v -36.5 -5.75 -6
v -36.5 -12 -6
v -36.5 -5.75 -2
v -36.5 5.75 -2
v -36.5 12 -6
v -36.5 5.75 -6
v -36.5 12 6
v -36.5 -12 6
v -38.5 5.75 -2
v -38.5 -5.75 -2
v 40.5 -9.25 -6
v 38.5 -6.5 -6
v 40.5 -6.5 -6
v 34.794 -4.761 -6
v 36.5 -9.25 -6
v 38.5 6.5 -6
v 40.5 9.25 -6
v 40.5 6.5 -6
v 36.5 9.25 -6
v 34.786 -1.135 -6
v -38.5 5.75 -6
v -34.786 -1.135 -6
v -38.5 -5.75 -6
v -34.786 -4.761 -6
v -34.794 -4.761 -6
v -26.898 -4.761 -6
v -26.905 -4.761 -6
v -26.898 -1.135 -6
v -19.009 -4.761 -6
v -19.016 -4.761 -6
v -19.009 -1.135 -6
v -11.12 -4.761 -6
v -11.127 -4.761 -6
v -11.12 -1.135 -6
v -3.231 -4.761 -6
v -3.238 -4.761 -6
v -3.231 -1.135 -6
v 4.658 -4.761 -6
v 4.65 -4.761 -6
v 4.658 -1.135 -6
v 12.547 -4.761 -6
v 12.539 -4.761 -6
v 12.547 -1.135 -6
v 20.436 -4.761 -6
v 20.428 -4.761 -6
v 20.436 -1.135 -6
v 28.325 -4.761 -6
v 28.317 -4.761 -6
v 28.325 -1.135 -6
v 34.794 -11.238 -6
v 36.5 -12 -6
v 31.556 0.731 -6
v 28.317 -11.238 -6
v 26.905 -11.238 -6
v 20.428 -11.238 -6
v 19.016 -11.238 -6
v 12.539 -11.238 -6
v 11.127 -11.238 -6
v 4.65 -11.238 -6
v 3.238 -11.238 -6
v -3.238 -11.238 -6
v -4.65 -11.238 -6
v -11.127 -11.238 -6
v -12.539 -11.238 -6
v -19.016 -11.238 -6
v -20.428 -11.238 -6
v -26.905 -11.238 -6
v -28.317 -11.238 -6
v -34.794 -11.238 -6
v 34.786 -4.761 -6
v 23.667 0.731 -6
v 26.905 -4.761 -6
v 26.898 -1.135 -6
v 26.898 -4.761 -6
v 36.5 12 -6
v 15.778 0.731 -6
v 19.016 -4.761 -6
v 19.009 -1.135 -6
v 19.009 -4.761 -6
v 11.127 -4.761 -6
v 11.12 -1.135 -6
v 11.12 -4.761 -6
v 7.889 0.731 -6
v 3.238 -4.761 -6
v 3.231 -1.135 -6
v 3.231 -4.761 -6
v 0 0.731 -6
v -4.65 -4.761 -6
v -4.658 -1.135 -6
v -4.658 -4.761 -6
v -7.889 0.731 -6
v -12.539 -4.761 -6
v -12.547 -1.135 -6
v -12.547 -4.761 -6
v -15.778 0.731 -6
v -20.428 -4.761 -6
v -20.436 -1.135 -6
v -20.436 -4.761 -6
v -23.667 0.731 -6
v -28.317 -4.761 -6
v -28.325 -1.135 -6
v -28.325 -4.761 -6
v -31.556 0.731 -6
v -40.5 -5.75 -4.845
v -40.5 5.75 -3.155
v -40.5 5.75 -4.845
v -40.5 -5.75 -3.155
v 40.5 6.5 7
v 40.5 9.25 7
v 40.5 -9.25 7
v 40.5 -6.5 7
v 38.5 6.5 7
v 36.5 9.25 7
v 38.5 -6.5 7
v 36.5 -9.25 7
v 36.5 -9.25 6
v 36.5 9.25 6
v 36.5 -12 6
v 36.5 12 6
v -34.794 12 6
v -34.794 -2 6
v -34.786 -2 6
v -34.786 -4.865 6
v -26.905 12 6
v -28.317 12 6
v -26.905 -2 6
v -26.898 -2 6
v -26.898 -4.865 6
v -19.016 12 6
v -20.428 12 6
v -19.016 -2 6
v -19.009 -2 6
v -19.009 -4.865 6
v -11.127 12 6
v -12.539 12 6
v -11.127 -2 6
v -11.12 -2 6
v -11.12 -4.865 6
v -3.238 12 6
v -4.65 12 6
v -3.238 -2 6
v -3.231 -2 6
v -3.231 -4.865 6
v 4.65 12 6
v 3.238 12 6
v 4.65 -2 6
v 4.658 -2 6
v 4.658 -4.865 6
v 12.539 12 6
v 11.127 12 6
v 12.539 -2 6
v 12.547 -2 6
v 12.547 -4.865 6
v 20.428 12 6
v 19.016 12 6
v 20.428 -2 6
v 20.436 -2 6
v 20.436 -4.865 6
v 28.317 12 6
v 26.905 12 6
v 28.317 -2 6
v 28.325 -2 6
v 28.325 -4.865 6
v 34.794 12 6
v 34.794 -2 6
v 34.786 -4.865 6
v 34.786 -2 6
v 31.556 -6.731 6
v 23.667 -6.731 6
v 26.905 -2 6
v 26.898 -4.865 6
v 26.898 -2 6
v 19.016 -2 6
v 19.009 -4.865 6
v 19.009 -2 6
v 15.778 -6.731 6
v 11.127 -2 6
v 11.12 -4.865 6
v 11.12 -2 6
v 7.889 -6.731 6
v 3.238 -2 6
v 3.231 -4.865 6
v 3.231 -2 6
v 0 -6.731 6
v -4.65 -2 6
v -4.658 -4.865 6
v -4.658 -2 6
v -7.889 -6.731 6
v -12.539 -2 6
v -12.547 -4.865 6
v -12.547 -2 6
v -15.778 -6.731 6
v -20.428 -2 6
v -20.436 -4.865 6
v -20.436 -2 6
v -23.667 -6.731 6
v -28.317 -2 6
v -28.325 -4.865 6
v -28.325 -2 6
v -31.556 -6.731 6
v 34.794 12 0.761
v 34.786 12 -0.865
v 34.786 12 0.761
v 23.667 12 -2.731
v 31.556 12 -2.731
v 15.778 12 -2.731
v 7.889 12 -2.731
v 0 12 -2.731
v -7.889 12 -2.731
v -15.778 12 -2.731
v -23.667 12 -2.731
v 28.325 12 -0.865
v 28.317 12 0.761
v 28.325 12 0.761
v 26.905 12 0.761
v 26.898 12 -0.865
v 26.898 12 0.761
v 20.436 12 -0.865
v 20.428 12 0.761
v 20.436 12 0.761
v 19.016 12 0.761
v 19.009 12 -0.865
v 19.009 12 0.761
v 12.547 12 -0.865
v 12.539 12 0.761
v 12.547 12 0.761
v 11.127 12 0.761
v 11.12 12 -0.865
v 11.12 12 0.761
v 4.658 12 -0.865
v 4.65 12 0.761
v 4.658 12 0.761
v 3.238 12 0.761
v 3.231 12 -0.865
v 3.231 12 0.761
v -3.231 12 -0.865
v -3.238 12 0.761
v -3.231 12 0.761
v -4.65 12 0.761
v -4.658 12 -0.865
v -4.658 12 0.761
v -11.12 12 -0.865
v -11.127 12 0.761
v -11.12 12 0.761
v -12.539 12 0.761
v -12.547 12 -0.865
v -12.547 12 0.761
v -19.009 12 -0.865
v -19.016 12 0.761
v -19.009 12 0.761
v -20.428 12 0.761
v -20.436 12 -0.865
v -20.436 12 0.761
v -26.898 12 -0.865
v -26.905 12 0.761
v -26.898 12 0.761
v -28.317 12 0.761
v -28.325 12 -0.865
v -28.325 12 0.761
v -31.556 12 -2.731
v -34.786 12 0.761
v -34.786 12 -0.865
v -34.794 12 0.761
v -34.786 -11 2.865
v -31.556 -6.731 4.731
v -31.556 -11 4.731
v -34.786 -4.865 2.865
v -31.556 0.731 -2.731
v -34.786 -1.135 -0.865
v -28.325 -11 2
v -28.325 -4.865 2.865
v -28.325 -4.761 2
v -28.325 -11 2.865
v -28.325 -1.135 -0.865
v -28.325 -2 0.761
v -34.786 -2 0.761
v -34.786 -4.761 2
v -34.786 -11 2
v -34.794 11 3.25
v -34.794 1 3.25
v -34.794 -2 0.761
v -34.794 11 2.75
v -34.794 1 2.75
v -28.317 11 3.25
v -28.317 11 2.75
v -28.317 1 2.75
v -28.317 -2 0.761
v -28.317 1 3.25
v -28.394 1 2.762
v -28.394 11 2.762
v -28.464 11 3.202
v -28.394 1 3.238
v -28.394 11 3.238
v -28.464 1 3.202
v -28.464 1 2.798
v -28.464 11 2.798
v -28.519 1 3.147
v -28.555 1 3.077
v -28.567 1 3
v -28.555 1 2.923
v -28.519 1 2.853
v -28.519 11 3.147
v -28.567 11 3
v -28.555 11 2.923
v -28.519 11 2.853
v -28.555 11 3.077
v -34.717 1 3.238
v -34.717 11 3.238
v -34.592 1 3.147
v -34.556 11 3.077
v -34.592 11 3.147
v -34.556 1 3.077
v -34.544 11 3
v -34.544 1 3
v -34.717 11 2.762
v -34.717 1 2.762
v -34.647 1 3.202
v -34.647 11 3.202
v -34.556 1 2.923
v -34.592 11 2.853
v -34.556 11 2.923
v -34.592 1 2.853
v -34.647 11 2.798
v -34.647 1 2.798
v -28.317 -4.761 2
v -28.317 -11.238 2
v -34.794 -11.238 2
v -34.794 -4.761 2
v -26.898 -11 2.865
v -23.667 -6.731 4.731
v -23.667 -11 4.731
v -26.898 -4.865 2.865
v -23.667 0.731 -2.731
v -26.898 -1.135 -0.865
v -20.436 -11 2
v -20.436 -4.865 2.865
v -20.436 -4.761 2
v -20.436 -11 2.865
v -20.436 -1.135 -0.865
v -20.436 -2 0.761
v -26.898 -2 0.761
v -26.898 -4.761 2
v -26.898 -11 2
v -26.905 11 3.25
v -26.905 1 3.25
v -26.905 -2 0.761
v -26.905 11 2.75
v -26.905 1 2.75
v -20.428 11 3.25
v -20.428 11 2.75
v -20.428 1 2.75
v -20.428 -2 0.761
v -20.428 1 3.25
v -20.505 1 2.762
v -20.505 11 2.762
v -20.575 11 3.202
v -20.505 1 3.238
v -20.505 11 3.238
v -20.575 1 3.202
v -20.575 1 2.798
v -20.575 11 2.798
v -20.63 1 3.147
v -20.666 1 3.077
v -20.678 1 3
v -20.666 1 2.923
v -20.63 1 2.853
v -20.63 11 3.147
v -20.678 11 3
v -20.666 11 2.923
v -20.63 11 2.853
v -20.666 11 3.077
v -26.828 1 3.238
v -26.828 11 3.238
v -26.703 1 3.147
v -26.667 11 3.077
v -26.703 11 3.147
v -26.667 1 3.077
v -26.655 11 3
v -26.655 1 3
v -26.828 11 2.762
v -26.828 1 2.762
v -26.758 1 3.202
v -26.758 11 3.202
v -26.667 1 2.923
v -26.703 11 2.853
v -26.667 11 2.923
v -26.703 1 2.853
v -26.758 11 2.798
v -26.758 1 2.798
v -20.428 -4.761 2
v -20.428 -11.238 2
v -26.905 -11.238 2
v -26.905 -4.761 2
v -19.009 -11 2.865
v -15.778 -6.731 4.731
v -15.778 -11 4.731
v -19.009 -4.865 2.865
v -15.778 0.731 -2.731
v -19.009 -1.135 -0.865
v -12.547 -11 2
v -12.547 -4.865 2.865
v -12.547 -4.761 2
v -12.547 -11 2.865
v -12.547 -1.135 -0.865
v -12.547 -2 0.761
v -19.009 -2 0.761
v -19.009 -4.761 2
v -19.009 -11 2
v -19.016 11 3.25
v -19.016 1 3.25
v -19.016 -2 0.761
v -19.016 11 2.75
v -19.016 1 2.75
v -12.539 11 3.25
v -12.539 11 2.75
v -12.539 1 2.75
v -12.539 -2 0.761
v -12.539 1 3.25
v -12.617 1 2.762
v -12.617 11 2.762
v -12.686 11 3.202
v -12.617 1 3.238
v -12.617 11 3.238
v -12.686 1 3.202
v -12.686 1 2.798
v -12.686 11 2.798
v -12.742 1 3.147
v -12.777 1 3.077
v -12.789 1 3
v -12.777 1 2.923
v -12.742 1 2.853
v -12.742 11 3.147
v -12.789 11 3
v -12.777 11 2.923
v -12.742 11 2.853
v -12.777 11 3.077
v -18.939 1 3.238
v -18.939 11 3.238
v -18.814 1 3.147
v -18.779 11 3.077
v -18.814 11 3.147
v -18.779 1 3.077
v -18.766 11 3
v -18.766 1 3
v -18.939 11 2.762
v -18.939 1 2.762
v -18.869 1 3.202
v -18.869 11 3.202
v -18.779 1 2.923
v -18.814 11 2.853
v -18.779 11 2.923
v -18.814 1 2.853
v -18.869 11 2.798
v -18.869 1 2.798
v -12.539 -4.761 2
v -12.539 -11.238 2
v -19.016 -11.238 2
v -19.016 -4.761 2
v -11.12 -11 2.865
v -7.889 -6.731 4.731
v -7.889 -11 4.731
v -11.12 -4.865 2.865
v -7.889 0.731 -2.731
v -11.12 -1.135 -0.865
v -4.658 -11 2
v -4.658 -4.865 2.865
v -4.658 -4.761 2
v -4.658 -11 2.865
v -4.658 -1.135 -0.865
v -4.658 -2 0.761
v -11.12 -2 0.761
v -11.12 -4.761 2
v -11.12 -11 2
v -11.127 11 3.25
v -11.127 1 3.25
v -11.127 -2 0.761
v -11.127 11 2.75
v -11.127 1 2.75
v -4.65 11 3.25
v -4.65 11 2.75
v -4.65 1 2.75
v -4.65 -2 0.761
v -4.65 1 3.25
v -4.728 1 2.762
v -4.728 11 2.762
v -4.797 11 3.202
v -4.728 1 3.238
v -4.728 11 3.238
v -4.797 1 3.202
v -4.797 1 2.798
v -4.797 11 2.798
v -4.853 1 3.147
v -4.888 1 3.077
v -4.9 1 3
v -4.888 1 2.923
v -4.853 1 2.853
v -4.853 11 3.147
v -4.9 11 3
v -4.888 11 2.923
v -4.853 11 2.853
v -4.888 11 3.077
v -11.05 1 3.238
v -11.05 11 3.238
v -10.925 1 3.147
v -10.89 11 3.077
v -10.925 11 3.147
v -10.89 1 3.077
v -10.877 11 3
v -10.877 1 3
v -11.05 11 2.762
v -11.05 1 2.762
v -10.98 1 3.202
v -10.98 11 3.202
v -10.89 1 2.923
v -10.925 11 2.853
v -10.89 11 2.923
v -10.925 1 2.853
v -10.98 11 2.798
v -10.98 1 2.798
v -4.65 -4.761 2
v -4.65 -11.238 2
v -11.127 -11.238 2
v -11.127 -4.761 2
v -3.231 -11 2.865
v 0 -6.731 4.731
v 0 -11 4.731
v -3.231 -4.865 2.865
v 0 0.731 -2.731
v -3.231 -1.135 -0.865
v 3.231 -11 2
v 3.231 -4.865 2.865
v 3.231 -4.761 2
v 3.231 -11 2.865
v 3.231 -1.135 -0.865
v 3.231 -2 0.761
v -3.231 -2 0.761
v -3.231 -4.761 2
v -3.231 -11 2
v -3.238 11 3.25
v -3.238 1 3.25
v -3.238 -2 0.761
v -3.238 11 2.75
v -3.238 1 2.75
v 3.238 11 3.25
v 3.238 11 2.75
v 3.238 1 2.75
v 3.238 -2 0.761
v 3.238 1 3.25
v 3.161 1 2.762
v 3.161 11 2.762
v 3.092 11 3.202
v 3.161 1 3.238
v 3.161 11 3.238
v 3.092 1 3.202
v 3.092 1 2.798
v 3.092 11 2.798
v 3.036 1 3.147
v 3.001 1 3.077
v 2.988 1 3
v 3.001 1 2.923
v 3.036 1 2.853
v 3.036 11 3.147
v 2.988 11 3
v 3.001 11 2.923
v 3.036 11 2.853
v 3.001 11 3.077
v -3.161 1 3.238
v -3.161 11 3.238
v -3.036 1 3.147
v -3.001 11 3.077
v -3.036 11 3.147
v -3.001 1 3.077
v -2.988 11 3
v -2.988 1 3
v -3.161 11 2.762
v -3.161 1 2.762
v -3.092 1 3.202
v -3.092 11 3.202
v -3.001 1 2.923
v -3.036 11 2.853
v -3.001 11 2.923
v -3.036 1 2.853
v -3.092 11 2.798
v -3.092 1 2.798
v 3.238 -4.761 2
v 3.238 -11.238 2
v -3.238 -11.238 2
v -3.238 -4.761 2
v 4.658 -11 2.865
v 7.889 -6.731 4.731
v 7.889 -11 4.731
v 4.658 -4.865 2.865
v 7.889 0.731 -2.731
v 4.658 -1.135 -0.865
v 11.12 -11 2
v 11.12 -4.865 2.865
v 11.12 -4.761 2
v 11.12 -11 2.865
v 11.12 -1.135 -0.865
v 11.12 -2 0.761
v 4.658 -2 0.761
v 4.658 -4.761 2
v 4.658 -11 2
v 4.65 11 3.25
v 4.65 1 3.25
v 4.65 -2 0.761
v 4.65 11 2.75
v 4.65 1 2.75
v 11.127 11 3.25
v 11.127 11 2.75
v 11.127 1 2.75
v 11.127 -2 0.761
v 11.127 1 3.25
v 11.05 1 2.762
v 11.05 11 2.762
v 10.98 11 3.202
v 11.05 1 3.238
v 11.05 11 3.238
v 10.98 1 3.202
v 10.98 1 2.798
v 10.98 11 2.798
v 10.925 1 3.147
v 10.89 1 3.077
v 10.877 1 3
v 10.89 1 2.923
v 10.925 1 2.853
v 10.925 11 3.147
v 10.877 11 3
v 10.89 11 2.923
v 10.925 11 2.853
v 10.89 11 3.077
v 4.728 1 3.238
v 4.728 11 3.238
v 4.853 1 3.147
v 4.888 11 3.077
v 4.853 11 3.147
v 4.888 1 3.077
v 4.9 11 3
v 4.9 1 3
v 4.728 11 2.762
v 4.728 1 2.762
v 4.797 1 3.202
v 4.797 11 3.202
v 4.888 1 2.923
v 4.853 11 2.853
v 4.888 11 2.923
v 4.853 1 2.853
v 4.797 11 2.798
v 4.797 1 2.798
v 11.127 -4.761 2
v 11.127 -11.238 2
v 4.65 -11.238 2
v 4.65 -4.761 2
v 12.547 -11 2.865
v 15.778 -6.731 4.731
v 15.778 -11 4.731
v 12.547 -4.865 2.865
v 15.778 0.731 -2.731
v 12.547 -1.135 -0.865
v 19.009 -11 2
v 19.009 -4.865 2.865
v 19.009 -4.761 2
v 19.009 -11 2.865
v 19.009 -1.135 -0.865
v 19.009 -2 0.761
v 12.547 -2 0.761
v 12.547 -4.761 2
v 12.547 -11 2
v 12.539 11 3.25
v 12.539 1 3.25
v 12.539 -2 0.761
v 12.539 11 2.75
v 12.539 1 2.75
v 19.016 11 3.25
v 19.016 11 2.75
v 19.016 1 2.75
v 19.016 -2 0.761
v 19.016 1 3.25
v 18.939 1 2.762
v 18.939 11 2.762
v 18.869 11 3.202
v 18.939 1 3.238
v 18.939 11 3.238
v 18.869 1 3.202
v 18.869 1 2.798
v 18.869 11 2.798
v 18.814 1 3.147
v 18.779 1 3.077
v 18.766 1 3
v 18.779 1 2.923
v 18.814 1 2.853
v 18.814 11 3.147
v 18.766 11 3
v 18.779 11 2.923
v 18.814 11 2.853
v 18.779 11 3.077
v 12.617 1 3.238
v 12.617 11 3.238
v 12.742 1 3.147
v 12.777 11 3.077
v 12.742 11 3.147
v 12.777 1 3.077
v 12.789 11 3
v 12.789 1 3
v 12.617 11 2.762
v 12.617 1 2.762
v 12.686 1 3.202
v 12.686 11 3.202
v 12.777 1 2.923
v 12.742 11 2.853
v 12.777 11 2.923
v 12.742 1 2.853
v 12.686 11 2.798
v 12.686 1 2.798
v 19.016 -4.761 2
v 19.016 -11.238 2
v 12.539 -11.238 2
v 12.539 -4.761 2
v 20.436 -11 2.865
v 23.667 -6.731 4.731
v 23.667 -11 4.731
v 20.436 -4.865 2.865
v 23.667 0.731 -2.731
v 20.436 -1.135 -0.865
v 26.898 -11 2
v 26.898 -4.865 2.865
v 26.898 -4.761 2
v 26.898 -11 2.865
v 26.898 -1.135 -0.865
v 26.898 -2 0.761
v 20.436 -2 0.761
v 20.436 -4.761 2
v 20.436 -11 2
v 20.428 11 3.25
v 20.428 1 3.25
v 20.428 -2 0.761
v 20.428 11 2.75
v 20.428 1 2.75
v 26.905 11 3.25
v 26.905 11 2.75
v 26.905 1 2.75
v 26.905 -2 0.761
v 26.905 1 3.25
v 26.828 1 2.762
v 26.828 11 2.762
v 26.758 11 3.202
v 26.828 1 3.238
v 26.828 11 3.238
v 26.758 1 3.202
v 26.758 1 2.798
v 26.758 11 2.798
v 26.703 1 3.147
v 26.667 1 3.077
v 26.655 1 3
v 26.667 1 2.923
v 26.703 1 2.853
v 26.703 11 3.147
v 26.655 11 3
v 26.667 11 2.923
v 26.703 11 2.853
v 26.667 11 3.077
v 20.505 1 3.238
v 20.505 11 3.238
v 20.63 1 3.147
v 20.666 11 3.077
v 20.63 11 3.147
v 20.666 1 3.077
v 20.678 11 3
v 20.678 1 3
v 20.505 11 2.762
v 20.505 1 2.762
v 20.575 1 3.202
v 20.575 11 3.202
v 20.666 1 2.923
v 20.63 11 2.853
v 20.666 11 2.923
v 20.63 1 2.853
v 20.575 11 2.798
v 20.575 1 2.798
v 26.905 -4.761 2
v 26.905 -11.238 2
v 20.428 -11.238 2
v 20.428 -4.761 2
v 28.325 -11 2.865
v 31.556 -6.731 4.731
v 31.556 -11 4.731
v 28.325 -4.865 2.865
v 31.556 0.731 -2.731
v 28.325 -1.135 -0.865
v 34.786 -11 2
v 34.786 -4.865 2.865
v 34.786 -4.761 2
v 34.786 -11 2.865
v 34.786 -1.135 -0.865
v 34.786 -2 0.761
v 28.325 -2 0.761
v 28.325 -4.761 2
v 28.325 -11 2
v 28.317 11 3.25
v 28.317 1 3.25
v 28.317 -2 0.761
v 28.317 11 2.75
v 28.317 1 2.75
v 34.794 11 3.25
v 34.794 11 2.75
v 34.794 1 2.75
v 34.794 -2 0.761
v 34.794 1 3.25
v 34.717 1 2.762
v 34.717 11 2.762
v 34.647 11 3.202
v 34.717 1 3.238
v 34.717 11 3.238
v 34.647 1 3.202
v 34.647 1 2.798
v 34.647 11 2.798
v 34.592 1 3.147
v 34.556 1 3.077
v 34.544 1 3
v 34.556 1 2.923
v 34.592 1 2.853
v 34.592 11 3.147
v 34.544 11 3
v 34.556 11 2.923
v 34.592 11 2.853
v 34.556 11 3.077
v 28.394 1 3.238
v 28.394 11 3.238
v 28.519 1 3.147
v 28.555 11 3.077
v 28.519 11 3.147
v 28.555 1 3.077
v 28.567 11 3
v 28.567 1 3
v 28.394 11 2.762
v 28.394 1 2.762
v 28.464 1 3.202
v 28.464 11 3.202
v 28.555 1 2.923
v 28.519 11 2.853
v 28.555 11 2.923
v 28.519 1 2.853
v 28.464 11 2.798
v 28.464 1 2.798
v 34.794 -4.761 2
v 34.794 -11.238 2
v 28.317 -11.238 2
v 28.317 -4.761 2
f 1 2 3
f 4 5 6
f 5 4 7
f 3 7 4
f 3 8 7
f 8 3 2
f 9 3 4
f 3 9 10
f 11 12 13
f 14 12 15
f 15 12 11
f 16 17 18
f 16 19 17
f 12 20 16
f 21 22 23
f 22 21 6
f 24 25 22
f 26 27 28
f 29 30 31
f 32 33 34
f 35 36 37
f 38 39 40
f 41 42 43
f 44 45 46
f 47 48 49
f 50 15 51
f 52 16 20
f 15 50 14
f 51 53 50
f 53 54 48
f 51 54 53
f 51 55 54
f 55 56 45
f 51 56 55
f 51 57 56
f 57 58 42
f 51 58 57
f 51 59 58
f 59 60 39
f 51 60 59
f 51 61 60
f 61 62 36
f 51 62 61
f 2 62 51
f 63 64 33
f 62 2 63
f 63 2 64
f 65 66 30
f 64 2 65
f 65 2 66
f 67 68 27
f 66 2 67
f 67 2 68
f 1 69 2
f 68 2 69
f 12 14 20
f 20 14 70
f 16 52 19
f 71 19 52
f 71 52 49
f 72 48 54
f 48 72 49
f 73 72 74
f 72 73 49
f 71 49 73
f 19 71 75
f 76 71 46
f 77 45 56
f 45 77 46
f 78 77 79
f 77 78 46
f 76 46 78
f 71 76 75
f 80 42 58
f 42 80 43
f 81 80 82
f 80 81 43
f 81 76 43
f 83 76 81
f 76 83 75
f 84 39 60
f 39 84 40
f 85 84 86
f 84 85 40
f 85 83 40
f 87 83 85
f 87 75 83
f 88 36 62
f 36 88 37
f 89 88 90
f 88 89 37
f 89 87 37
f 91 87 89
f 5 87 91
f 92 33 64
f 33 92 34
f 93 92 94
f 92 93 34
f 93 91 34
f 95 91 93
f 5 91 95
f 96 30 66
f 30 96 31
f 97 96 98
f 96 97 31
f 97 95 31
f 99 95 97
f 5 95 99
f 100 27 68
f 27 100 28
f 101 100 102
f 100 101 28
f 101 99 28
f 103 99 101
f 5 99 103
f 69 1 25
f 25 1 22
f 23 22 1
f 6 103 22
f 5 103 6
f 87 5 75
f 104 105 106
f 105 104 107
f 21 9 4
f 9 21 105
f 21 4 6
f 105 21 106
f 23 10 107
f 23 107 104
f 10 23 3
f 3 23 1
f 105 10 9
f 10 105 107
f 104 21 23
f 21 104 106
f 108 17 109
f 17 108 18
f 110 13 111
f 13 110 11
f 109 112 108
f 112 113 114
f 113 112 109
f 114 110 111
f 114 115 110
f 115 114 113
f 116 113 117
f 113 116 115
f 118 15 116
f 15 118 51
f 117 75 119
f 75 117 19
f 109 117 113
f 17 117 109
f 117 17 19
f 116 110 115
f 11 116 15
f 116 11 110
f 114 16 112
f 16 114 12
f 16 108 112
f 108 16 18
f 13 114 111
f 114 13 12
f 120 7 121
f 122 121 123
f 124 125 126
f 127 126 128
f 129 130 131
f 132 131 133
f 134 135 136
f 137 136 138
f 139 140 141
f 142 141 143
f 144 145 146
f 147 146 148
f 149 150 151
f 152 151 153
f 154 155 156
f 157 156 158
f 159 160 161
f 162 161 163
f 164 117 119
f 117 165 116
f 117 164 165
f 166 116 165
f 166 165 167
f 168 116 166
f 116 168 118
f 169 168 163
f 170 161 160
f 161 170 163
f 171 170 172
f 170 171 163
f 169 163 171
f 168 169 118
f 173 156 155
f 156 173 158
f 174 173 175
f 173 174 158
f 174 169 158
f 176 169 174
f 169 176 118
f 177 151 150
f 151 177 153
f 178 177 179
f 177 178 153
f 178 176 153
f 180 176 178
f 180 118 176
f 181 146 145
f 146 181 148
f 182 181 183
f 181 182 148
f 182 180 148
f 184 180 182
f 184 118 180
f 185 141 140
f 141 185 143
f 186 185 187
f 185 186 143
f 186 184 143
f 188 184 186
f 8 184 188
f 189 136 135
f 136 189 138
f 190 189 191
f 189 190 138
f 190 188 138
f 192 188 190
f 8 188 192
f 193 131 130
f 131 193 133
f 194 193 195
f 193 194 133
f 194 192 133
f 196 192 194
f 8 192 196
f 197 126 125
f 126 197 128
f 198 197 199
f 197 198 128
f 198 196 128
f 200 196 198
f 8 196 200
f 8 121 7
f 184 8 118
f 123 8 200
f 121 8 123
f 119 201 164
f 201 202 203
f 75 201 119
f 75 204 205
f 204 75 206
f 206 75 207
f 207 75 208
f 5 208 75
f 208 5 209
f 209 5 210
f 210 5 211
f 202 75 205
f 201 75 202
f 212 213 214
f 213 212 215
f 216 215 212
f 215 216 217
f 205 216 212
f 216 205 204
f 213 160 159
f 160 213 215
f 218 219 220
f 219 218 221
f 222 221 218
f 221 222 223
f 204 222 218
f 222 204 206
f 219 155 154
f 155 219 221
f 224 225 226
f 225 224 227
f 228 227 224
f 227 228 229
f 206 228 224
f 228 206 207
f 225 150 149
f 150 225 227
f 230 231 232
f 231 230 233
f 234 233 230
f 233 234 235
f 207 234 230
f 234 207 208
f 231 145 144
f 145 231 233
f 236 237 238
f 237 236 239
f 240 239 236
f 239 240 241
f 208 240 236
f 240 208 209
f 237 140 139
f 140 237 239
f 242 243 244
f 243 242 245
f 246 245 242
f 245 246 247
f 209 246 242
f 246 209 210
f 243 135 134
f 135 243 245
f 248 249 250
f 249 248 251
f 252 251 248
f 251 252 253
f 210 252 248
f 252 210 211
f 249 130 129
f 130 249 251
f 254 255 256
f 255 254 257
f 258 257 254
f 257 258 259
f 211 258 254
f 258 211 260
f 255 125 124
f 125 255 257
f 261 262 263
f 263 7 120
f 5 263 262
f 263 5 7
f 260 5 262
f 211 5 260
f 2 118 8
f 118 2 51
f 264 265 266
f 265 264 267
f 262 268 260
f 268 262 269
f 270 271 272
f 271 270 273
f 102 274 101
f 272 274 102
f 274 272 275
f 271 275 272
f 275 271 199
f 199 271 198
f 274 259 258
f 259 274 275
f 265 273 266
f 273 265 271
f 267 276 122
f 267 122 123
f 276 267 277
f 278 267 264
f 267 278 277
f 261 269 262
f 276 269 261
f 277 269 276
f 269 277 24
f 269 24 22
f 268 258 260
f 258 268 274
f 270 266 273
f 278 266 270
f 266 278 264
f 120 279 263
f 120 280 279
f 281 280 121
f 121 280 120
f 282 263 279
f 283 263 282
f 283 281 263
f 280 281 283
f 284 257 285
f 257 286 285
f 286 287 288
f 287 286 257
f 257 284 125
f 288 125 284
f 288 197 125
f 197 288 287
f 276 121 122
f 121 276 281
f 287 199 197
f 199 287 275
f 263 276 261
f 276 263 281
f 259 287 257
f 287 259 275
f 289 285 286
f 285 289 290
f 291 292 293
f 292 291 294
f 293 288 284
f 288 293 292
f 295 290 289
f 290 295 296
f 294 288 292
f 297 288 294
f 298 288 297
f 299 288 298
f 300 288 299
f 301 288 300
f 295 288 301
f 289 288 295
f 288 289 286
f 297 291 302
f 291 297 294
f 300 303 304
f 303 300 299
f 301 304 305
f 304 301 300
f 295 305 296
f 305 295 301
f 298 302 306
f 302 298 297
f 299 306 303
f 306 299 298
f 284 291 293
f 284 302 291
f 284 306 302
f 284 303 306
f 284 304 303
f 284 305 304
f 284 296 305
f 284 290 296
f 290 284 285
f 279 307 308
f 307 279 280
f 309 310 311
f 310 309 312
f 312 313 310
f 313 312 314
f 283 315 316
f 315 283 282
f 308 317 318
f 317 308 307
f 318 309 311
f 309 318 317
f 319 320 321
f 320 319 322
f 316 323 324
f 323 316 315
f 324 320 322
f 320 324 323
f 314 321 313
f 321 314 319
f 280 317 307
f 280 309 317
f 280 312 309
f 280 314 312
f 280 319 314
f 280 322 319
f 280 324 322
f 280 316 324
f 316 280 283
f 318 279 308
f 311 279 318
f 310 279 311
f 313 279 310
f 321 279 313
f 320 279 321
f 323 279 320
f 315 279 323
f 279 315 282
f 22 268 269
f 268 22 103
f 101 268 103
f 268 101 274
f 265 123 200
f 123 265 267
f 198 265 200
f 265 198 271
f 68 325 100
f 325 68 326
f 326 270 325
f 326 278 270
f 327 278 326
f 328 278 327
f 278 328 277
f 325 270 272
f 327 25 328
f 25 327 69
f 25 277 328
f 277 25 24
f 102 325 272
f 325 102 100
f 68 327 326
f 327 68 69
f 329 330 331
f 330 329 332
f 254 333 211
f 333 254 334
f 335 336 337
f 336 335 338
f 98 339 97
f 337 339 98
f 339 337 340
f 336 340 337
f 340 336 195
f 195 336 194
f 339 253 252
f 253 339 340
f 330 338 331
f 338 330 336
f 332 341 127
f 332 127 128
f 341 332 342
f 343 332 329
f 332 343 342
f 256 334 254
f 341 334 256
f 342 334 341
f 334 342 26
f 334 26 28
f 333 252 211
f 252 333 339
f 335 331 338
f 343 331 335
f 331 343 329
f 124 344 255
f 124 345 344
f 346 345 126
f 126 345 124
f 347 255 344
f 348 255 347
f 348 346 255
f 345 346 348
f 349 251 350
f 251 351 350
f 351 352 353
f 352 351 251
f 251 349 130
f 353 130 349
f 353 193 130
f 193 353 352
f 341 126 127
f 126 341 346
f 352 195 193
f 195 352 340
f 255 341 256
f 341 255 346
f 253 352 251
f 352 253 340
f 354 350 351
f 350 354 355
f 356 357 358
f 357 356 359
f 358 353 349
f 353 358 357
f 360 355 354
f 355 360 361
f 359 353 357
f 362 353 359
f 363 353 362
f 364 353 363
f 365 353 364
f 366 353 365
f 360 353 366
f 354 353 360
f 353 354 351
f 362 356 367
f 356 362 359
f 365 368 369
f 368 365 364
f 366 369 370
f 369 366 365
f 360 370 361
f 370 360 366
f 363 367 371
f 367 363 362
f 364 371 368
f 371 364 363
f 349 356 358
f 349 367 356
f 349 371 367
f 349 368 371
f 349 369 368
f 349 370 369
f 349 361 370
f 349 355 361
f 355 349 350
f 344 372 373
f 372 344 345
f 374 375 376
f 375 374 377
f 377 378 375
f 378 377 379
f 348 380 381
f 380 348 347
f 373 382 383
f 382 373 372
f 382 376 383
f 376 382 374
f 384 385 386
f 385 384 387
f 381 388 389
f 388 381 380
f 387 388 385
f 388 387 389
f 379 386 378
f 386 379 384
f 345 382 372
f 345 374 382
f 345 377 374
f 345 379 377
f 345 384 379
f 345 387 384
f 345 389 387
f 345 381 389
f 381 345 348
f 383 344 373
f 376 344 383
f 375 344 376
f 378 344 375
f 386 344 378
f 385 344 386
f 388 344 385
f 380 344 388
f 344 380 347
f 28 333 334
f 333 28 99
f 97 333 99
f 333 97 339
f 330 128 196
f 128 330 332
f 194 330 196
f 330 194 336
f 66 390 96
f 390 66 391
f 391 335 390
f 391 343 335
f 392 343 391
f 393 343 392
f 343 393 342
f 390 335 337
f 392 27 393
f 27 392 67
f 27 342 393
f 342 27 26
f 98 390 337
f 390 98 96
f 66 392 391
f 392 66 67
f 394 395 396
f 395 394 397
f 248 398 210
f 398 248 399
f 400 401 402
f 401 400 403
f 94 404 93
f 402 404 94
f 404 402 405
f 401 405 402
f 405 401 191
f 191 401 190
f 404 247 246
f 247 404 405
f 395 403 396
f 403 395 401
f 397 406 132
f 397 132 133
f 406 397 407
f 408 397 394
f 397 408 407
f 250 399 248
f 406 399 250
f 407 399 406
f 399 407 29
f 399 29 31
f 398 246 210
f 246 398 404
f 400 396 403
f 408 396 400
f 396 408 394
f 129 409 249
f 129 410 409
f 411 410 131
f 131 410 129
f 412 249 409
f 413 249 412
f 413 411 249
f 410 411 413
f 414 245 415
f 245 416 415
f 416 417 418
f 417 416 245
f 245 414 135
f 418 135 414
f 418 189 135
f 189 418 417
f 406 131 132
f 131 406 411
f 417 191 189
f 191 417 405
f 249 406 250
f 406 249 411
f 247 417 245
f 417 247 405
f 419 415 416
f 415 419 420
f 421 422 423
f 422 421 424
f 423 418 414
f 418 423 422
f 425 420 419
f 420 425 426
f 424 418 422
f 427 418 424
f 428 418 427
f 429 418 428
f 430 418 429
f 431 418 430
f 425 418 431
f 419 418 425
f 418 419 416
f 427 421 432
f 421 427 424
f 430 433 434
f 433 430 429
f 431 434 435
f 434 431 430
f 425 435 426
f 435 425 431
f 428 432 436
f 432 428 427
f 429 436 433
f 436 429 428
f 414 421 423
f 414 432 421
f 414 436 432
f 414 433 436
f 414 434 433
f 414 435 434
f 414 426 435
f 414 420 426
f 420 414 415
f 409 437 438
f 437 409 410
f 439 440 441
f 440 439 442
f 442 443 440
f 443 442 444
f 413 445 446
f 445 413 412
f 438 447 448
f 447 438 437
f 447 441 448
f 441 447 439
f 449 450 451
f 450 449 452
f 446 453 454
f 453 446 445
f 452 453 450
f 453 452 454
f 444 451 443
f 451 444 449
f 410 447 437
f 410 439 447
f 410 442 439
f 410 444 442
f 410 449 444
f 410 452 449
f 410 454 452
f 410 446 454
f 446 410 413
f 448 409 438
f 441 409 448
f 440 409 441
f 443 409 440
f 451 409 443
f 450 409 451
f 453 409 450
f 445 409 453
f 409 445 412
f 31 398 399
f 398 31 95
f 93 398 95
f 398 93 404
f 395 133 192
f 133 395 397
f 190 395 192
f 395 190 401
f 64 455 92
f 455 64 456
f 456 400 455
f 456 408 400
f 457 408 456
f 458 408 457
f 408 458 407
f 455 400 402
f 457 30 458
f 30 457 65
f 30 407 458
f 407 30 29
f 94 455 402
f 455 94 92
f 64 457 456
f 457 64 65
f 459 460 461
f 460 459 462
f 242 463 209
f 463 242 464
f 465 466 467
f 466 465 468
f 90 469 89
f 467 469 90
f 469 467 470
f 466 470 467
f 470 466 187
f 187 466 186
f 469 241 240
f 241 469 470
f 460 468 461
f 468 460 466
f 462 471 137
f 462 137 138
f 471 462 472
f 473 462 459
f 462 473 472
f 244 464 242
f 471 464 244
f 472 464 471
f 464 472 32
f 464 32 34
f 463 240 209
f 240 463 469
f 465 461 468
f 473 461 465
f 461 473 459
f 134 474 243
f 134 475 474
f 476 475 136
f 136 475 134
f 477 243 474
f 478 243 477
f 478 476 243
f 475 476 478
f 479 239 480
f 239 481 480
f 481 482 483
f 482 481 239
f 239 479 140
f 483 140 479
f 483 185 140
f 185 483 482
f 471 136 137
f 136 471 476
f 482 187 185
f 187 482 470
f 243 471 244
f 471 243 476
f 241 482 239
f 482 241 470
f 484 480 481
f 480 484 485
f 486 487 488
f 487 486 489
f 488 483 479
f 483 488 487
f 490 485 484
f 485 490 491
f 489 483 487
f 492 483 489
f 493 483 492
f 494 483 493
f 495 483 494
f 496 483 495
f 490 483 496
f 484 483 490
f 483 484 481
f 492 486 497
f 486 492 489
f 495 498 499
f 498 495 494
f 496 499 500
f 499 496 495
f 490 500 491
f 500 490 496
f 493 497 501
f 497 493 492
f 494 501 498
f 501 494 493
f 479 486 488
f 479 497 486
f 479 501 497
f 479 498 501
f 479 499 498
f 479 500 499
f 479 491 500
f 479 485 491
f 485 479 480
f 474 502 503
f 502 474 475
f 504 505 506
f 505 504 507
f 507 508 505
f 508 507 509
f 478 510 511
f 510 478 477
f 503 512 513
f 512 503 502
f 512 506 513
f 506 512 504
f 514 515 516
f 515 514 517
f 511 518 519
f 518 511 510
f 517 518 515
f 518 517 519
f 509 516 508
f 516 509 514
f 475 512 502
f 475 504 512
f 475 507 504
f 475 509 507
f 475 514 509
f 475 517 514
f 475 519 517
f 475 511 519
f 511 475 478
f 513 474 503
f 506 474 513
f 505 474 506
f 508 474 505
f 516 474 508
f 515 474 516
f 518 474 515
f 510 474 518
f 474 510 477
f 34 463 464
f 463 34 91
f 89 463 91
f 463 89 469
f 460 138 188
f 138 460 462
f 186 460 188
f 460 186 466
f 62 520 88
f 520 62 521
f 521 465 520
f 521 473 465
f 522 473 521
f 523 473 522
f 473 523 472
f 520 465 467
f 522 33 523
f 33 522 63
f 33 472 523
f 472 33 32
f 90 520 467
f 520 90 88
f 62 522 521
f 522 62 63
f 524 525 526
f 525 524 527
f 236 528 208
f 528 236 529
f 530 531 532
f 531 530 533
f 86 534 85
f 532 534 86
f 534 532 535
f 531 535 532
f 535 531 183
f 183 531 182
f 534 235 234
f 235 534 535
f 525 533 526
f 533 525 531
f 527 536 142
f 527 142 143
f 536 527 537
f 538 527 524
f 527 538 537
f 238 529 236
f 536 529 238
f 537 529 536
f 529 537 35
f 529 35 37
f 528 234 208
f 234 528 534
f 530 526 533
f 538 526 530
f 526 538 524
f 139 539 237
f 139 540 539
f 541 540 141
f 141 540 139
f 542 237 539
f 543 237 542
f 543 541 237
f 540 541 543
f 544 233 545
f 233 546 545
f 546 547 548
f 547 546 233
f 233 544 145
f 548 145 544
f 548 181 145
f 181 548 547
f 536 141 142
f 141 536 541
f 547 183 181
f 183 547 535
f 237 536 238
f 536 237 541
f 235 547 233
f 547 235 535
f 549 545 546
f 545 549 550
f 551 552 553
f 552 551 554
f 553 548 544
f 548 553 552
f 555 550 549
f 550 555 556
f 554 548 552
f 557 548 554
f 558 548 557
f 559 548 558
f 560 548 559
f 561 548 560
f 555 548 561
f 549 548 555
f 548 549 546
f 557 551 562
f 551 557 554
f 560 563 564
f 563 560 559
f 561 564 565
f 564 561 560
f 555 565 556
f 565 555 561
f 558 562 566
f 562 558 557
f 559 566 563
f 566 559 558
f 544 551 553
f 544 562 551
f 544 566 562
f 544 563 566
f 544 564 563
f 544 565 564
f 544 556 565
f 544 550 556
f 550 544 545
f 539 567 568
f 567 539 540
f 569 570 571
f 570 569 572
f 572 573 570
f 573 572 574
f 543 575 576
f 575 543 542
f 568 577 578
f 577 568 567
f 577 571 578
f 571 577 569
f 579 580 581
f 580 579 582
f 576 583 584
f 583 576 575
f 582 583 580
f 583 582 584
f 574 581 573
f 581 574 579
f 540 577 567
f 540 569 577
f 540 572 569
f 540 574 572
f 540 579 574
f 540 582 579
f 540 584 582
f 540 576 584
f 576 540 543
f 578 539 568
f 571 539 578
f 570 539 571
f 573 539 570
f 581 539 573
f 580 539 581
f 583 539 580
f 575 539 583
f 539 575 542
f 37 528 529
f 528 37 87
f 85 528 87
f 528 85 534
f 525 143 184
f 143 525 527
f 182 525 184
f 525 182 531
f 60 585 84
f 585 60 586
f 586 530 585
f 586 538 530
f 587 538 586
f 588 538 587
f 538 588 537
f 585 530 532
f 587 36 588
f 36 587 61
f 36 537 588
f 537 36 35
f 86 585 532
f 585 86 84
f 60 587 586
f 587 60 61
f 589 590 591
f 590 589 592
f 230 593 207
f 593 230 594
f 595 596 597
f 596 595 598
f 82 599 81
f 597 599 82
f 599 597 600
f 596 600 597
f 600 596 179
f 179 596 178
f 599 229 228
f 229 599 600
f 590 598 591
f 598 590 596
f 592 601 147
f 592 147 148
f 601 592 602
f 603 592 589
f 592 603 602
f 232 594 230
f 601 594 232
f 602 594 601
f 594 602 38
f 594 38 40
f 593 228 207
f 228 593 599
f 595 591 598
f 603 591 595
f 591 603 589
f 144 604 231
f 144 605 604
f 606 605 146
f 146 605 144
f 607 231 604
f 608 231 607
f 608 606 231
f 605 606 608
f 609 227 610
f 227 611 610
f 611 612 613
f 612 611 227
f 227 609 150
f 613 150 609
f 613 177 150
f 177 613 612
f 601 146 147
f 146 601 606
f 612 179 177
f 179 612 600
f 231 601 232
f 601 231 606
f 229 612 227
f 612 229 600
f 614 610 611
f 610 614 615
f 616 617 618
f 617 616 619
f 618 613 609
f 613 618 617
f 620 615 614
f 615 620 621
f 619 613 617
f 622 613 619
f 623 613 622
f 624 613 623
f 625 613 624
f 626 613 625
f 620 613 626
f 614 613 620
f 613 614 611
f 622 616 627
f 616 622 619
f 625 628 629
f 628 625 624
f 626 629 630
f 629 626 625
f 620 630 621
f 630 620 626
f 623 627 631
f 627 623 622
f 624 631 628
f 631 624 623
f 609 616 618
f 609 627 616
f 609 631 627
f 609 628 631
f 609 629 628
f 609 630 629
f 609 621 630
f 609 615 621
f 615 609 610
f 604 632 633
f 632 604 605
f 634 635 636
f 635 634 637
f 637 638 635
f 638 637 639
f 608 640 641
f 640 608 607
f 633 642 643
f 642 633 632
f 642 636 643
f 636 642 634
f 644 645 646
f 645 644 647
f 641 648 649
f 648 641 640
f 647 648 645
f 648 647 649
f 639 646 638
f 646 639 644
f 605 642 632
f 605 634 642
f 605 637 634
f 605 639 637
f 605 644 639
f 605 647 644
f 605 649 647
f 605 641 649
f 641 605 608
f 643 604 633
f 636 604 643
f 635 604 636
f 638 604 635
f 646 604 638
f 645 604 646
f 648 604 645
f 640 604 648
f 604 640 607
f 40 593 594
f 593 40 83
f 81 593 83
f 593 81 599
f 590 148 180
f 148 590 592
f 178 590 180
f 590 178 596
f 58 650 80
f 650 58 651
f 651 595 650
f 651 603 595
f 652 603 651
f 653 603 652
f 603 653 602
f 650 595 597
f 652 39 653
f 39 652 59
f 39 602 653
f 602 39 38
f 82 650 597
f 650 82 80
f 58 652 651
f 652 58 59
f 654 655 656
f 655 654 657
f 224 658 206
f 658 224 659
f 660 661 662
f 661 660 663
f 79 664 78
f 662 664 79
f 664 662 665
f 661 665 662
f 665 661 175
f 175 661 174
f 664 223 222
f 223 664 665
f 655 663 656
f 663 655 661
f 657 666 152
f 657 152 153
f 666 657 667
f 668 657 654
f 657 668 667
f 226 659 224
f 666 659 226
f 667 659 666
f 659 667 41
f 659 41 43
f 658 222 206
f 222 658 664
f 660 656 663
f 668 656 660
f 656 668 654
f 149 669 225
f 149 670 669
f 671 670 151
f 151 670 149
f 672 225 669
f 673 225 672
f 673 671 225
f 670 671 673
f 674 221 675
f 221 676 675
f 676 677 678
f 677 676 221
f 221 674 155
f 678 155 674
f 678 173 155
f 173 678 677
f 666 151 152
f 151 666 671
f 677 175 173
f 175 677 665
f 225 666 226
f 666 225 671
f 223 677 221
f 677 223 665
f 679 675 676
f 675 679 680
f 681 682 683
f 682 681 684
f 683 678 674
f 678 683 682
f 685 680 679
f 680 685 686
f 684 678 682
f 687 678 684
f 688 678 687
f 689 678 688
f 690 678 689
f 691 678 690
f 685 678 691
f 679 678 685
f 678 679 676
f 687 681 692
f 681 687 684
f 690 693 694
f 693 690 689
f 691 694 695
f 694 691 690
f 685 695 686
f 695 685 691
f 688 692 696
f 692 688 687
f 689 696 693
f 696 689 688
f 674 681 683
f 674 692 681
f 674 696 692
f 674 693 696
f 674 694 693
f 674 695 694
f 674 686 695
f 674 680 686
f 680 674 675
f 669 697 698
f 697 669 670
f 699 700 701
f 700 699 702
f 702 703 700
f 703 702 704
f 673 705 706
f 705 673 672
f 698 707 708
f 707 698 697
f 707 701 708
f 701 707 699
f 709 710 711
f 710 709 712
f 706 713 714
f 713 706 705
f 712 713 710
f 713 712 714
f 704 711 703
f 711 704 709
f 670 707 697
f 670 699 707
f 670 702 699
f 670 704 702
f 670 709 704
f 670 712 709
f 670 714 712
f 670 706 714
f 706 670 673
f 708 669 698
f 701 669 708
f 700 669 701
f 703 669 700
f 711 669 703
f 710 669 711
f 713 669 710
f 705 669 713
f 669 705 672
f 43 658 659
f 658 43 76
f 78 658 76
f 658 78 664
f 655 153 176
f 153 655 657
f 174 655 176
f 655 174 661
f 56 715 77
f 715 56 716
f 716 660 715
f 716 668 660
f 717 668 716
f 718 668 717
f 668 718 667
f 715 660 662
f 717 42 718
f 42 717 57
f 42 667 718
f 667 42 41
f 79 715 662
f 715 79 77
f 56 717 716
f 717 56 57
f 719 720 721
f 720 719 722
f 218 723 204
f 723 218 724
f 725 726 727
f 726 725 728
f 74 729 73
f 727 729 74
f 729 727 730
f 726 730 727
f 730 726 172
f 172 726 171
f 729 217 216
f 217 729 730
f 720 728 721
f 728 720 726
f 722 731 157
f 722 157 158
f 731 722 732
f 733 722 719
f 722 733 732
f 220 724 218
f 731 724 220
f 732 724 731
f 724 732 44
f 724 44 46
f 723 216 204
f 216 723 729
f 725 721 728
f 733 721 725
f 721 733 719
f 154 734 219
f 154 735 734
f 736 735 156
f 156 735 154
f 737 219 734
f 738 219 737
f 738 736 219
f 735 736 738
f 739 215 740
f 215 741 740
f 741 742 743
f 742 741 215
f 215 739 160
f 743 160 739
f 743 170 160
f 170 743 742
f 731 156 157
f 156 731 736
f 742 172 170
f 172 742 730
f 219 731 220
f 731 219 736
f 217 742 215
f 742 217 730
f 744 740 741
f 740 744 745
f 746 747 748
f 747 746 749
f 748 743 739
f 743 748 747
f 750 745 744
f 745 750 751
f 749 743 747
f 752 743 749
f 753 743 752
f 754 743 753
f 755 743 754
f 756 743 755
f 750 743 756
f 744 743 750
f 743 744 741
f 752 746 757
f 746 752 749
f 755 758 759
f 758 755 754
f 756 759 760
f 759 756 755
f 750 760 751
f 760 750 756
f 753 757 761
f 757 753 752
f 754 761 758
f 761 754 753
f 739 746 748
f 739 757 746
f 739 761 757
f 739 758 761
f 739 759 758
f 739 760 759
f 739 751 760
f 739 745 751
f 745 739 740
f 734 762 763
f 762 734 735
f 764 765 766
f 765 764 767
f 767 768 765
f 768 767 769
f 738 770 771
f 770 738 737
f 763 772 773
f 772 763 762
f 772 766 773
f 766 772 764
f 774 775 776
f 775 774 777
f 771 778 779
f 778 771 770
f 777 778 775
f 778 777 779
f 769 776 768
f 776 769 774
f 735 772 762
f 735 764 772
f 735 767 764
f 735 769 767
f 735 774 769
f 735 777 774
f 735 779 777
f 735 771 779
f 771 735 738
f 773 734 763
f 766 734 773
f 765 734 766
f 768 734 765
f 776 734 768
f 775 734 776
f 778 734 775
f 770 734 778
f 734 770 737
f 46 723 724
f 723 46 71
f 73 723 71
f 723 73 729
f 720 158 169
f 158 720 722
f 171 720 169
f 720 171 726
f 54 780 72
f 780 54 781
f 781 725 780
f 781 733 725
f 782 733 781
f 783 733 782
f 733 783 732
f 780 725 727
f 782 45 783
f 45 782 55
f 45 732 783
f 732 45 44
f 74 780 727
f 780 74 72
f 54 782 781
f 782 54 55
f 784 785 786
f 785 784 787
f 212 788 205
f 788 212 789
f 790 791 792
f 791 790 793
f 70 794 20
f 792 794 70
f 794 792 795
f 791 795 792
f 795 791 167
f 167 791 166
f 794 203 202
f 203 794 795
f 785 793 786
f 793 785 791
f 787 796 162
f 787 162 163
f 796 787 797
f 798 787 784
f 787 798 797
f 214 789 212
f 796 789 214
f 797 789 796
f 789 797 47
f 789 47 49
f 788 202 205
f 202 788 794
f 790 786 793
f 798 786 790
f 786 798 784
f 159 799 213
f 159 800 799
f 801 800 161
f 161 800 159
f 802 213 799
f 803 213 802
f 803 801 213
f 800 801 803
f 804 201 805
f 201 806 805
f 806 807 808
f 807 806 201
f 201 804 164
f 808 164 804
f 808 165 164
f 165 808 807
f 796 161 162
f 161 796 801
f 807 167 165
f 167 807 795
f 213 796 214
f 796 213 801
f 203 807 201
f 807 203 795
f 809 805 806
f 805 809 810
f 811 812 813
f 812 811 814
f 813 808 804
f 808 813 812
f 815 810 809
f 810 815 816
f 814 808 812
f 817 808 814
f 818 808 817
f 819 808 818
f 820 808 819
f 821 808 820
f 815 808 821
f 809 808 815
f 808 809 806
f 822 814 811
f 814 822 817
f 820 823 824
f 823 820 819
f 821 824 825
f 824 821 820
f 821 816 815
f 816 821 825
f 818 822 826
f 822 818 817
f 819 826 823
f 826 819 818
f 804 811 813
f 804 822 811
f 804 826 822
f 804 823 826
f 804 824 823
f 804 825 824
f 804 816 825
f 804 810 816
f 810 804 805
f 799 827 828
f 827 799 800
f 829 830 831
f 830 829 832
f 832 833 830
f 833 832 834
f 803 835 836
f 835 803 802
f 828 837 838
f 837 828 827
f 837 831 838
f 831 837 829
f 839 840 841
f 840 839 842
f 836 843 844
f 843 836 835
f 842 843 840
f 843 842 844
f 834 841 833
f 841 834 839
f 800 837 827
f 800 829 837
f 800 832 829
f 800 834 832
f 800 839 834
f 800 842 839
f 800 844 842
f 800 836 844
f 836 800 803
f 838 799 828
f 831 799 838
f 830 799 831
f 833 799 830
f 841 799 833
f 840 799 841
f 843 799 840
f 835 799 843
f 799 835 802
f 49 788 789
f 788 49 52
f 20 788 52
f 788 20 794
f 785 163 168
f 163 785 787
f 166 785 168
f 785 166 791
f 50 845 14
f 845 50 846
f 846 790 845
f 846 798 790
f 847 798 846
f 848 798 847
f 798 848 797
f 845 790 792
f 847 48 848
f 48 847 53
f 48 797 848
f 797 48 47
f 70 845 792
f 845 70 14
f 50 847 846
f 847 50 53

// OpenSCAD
// Size of the holder
length = 73;
width = 24;
height = 12;

//size of the tab
tab_height = 4;
tab_width = 4;
tab_length = 11.5;

//size of the lock
lock_length = 18.5;
lock_height = 13;
lock_width = 4;
cut_length = 13;
cut_width = 2;

// bit fudge factor
fudge = 1.02;

//inches to mm conversion
in_to_mm = 25.4;

//bit size
bit_dia_points =.288*in_to_mm*fudge;
bit_dia_flats = .25*in_to_mm*fudge;

//number of slots for bits
num_slots= 9;

keeper_length = 10;
keeper_dia = 0.5;
    
difference(){
    union(){
        // main body
        cube([length,width, height],center=true);
        
        //tab
        difference(){
            translate([-(length+tab_width)/2, 0, -(height-tab_height)/2]) cube([tab_width,tab_length,tab_height],center=true);
            
            translate([-(length+tab_width+4)/2, 0,-(height/2-tab_height)]) rotate([0,-30,0]) cube([tab_width,tab_length,2],center=true);
            
            translate([-(length+tab_width+4)/2, 0,-height/2]) rotate([0,30,0]) cube([tab_width,tab_length,2],center=true);
    
        }
        //lock
        translate([(length+lock_width)/2, 0, -(height-lock_height)/2])
        difference(){
            cube([lock_width, lock_length, lock_height],center=true);
            translate([(lock_width-cut_width)/2, 0, 0]) cube([cut_width, cut_length, lock_height],center=true);
        }
    }

    min_edge = 1;
    width2= length - 2 * min_edge;
    step = width2 /(num_slots);
    start = -width2/2+step/2;
    end = width2/2;     
    for (x=[start:step:end]){
        translate([x,0,0])SingleBitHolder();
    }
}
module SingleBitHolder(){
    difference(){
    union(){
    // horizontal hole
    translate([0,1,height/2-5])rotate([90,30,0])cylinder(d=bit_dia_points, h=width, center=true,$fn=6);
    translate([0,10,height/2-2])rotate([90,0,0])cube([bit_dia_flats,bit_dia_flats,width], center=true);
    }
    
    //bit keepers
    translate([bit_dia_flats/2,6,height/2-3])rotate([90,0,0])cylinder(d=keeper_dia,h=keeper_length, center=true,$fn=20);
    translate([-bit_dia_flats/2,6,height/2-3])rotate([90,0,0])cylinder(d=keeper_dia,h=keeper_length, center=true,$fn=20);
    }
    // vertical hole
    translate([0,-3,0])rotate([0,0,30])cylinder(d=bit_dia_points, h=height, center=true,$fn=6);
    translate([0,-8,-4])cube([bit_dia_flats,bit_dia_flats,height], center=true);
}
